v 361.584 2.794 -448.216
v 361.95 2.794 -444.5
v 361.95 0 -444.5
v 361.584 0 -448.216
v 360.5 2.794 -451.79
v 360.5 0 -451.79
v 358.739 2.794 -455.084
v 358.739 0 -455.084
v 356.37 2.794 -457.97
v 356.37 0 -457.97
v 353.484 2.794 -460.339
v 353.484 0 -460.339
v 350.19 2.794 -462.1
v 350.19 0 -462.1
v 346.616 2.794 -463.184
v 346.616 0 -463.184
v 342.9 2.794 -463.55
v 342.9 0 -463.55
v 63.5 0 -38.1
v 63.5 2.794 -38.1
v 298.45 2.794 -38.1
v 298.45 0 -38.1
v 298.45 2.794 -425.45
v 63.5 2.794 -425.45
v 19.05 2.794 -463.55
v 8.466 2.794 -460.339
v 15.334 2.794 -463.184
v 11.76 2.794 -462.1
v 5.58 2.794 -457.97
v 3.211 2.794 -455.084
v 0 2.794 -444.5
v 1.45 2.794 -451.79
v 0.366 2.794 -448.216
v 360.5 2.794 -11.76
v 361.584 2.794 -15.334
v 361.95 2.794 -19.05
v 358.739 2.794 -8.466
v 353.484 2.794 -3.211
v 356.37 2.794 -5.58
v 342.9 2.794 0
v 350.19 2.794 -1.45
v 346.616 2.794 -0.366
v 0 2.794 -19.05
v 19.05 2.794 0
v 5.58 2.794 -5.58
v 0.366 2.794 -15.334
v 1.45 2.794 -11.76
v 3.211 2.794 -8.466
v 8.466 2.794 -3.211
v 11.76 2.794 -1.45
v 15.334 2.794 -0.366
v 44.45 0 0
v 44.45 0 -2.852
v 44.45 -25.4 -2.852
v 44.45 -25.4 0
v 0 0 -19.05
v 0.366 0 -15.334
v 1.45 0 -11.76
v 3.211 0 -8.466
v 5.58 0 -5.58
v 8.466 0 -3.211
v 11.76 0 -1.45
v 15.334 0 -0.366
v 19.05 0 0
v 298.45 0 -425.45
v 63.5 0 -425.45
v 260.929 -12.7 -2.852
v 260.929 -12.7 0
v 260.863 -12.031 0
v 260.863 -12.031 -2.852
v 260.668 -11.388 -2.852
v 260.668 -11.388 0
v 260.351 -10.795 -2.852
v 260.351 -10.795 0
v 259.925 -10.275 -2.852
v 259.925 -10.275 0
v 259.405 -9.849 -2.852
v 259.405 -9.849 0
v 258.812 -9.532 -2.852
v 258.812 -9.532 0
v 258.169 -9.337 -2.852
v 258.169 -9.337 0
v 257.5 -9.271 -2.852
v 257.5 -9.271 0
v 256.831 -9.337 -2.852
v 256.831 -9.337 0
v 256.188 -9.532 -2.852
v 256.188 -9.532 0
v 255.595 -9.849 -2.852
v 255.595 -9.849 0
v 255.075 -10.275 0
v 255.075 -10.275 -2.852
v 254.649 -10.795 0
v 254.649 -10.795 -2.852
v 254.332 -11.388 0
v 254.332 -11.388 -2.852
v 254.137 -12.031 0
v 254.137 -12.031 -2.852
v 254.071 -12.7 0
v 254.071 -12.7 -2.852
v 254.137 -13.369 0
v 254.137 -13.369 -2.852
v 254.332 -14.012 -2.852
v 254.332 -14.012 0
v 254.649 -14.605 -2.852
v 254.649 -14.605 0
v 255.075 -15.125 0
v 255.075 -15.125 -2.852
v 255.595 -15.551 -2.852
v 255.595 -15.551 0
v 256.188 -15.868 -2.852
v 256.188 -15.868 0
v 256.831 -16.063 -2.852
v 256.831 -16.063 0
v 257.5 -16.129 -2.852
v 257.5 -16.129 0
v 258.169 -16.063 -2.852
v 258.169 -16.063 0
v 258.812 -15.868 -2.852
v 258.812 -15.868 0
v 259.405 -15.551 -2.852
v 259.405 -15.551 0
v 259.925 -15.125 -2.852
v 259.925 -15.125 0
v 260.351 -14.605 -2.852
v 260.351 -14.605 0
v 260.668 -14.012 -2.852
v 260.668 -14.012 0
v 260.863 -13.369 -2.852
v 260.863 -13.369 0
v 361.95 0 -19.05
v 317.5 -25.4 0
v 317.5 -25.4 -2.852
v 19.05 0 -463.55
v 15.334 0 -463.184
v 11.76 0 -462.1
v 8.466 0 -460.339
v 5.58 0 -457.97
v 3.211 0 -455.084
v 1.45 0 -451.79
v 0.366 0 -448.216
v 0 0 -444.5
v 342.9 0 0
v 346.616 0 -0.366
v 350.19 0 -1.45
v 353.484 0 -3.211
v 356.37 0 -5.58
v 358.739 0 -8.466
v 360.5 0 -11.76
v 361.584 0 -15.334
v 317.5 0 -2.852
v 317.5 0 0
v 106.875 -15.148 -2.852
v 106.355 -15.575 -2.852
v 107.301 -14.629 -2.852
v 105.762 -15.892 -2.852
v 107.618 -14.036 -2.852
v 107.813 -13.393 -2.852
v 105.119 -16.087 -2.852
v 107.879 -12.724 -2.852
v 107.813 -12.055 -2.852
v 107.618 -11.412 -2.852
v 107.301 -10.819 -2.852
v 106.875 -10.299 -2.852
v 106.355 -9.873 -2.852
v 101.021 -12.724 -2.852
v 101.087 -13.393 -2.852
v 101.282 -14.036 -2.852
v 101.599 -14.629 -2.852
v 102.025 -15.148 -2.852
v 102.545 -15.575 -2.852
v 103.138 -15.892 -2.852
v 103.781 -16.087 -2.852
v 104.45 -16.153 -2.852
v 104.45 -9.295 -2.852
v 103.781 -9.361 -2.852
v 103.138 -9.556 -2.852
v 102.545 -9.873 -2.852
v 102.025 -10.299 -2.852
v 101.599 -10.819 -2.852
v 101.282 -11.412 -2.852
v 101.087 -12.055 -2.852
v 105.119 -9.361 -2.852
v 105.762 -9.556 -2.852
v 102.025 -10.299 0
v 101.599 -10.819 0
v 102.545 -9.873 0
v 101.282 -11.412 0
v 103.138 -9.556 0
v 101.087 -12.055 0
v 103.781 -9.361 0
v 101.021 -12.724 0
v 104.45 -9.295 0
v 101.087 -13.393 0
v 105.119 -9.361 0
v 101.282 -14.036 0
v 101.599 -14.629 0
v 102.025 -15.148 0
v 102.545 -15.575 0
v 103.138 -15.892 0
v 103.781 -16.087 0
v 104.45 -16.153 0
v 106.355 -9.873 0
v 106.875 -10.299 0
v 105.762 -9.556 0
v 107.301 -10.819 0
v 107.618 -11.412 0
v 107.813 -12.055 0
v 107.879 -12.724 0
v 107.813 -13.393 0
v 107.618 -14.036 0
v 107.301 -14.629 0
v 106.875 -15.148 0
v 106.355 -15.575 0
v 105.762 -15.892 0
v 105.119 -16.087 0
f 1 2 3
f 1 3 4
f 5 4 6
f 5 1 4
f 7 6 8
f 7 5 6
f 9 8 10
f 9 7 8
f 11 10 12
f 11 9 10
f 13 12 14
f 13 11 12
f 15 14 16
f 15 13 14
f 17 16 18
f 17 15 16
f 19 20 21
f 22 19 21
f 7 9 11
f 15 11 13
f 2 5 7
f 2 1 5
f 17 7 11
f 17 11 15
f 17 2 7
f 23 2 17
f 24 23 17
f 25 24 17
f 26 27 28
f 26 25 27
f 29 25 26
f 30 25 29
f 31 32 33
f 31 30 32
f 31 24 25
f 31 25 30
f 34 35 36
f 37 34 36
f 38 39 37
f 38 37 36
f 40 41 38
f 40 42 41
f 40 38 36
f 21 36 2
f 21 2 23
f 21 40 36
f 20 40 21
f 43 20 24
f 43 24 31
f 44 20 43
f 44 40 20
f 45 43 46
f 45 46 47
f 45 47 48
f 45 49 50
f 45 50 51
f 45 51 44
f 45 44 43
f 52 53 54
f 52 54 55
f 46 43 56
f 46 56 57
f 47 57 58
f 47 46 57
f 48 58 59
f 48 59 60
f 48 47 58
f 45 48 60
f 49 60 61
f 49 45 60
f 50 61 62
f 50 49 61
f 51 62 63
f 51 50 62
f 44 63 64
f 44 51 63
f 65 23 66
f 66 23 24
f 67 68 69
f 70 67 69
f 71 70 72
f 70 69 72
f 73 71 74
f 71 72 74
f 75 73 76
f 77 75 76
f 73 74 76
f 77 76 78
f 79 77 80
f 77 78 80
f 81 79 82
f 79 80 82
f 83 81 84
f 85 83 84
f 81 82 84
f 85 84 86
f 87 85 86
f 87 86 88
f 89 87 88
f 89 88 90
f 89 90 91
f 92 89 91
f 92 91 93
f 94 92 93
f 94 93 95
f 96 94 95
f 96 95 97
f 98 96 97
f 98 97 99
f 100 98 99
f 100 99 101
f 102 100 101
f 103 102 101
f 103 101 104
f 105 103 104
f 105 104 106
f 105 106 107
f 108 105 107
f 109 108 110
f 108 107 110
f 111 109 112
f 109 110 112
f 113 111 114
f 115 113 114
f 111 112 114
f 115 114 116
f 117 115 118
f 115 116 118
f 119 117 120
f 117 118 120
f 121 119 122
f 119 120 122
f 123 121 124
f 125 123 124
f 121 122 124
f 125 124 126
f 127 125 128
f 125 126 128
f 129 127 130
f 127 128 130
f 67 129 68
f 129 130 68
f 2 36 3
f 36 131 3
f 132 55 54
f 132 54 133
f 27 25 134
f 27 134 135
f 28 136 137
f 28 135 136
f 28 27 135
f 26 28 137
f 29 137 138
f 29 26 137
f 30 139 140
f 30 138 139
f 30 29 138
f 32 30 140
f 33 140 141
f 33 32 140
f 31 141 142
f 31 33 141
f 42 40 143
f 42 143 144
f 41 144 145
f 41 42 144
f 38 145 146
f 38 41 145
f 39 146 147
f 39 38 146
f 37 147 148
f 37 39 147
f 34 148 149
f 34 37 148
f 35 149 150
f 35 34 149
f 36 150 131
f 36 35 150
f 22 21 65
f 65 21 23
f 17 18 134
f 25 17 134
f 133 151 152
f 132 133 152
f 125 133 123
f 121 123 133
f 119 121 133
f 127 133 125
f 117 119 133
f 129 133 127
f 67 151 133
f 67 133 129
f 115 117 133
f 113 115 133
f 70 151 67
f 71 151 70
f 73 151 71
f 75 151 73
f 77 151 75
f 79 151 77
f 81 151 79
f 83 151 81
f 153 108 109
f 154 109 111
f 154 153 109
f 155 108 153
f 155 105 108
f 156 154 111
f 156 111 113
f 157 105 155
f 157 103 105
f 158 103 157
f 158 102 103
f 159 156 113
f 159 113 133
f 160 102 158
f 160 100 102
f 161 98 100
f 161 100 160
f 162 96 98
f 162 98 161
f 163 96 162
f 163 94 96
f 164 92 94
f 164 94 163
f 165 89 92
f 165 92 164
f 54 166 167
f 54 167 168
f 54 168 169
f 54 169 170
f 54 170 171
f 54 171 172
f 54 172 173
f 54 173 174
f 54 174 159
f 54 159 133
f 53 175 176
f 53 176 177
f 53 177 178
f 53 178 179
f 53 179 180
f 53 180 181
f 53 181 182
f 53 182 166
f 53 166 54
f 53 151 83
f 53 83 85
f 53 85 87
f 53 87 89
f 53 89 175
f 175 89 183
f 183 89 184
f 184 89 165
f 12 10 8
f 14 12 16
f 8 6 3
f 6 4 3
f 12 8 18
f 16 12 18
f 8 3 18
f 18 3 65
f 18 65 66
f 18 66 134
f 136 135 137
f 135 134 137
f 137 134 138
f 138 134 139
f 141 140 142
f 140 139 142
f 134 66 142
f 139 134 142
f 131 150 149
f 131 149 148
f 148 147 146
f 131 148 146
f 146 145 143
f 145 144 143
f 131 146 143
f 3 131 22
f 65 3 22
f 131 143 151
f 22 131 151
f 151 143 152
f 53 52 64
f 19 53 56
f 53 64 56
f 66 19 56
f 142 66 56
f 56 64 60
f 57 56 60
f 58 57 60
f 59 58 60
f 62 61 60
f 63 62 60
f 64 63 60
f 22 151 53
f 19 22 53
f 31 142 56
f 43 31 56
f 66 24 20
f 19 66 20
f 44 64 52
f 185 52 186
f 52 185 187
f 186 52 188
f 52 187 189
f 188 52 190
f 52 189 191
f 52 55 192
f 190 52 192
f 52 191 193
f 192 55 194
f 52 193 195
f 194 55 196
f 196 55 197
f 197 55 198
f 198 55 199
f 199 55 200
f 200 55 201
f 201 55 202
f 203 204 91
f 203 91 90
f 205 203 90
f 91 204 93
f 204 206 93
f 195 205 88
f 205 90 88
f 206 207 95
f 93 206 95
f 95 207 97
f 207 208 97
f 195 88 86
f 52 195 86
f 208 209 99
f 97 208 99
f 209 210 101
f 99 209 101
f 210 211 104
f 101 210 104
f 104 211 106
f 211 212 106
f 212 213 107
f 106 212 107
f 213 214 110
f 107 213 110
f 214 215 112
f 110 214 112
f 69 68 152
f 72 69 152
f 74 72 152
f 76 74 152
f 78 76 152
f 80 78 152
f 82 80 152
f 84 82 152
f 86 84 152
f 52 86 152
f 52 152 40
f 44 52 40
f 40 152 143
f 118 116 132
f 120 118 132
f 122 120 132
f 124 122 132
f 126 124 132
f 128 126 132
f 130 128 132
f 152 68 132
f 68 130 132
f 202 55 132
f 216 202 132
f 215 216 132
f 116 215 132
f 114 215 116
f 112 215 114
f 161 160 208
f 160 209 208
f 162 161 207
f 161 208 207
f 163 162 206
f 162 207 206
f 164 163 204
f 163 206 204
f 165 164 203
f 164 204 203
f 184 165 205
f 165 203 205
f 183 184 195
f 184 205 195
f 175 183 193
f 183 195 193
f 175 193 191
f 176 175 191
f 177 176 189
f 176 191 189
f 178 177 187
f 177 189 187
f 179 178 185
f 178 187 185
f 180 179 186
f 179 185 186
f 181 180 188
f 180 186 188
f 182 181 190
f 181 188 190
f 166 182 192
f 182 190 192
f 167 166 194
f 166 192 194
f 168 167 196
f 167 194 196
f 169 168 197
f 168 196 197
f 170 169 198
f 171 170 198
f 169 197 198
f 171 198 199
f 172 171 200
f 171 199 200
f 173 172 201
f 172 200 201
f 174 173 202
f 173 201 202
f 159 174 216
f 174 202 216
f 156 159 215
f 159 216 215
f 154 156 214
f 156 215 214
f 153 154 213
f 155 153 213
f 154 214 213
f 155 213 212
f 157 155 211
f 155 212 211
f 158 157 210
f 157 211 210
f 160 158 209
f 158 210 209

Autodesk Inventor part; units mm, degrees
ref_plane "YZ Plane" through (0, 0, 0) normal (1, 0, 0) x (0, 1, 0)
ref_plane "XZ Plane" through (0, 0, 0) normal (0, 1, 0) x (-1, 0, 0)
ref_plane "XY Plane" through (0, 0, 0) normal (0, 0, 1) x (1, 0, 0)
sketch "Sketch1" plane through (0, 0, 0) normal (0, 1, 0) x (-1, 0, 0)
  line L0 (0, 0) -> (-361.95, 0)
  line L1 (-361.95, 0) -> (-361.95, -463.55)
  line L2 (-361.95, -463.55) -> (0, -463.55)
  line L3 (0, -463.55) -> (0, 0)
  dimension "d0" = 361.95
  dimension "d1" = 463.55
extrude "Extrusion1" add sketch "Sketch1" along normal blind 2.794
fillet "Fillet1" radius 19.05 4 edges at (361.95, 1.397, 0) (361.95, 1.397, -463.55) (0, 1.397, -463.55) (0, 1.397, 0)
sketch "Sketch2" plane through (0, 0, 0) normal (0, -1, 0) x (1, 0, 0)
  line L0 (19.05, 0) -> (342.9, 0)
  line L1 (342.9, 0) -> (342.9, -2.8525)
  line L2 (342.9, -2.8525) -> (19.05, -2.8525)
  line L3 (19.05, -2.8525) -> (19.05, 0)
  line L4 (342.9, -2.8525) -> (317.5, -2.8525)
  line L5 (317.5, -2.8525) -> (317.5, 0)
  line L6 (317.5, 0) -> (342.9, 0)
  line L7 (342.9, 0) -> (342.9, -2.8525)
  line L8 (19.05, -2.8525) -> (44.45, -2.8525)
  line L9 (44.45, -2.8525) -> (44.45, 0)
  line L10 (44.45, 0) -> (19.05, 0)
  line L11 (19.05, 0) -> (19.05, -2.8525)
  line L12 (44.45, -2.8525) -> (317.5, -2.8525)
  line L13 (317.5, -2.8525) -> (317.5, 0)
  line L14 (317.5, 0) -> (44.45, 0)
  line L15 (44.45, 0) -> (44.45, -2.8525)
  point P0 (0, 0)
  dimension "d5" = 25.4
  dimension "d6" = 25.4
extrude "Extrusion2" add sketch "Sketch2" along normal blind 25.4 contours L0 L5 L2 L9
sketch "Sketch3" plane through (19.05, 2.794, 0) normal (0, 0, 1) x (1, 0, 0)
  line L0 (323.85, -2.794) -> (0, -2.794) projected
  line L1 (25.405, -2.794) -> (25.4, -15.494)
  line L2 (25.4, -2.794) -> (25.4, -28.194) projected
  line L3 (25.4, -15.494) -> (85.4, -15.5178)
  line L4 (298.45, -2.794) -> (298.45, -28.194) projected
  line L5 (298.45, -15.494) -> (238.45, -15.494)
  circle A0 centre (85.4, -15.5178) radius 3.429
  circle A1 centre (238.45, -15.494) radius 3.429
  point P0 (-19.05, -2.794)
  dimension "d9" = 12.7
  dimension "d10" = 60
  dimension "d11" = 60
  dimension "d12" = 6.858
  dimension "d13" = 6.858
extrude "Extrusion3" cut sketch "Sketch3" against normal blind 25.4 contours A0 | A1
sketch "Sketch4" plane through (0, 2.794, 0) normal (0, 1, 0) x (1, 0, 0)
  arc A0 (0, 19.05) -> (19.05, 0) centre (19.05, 19.05) ccw projected
  line L0 (19.05, 0) -> (342.9, 0) projected
  arc A1 (342.9, 0) -> (361.95, 19.05) centre (342.9, 19.05) ccw projected
  line L1 (361.95, 19.05) -> (361.95, 444.5) projected
  arc A2 (361.95, 444.5) -> (342.9, 463.55) centre (342.9, 444.5) ccw projected
  line L2 (342.9, 463.55) -> (19.05, 463.55) projected
  arc A3 (19.05, 463.55) -> (0, 444.5) centre (19.05, 444.5) ccw projected
  line L3 (0, 444.5) -> (0, 19.05) projected
  point P0 (0, 0)
sketch "Sketch5" plane through (0, 2.794, 0) normal (0, 1, 0) x (1, 0, 0)
  arc A0 (0, 19.05) -> (19.05, 0) centre (19.05, 19.05) ccw projected
  line L0 (19.05, 0) -> (342.9, 0) projected
  arc A1 (342.9, 0) -> (361.95, 19.05) centre (342.9, 19.05) ccw projected
  line L1 (361.95, 19.05) -> (361.95, 444.5) projected
  arc A2 (361.95, 444.5) -> (342.9, 463.55) centre (342.9, 444.5) ccw projected
  line L2 (342.9, 463.55) -> (19.05, 463.55) projected
  arc A3 (19.05, 463.55) -> (0, 444.5) centre (19.05, 444.5) ccw projected
  line L3 (0, 444.5) -> (0, 19.05) projected
  line L4 (342.9, 444.5) -> (19.05, 19.05)
  line L5 (342.9, 19.05) -> (19.05, 444.5)
  line L6 (298.45, 425.45) -> (63.5, 425.45)
  line L7 (63.5, 425.45) -> (63.5, 38.1)
  line L8 (63.5, 38.1) -> (298.45, 38.1)
  line L9 (298.45, 38.1) -> (298.45, 425.45)
  line L10 (298.45, 425.45) -> (63.5, 38.1) construction
  line L11 (63.5, 425.45) -> (298.45, 38.1) construction
  point P0 (0, 0)
  point P1 (180.975, 231.775)
  dimension "d16" = 234.95
  dimension "d17" = 387.35
extrude "Extrusion4" cut sketch "Sketch5" against normal blind 25.4 contours L9 L5 L4 | L4 L5 L7 L6 L9 | L5 L9 L8 L7 L4 | L4 L7 L5
properties part number "Cart_TOP_SHELF" material "Cart Material"
